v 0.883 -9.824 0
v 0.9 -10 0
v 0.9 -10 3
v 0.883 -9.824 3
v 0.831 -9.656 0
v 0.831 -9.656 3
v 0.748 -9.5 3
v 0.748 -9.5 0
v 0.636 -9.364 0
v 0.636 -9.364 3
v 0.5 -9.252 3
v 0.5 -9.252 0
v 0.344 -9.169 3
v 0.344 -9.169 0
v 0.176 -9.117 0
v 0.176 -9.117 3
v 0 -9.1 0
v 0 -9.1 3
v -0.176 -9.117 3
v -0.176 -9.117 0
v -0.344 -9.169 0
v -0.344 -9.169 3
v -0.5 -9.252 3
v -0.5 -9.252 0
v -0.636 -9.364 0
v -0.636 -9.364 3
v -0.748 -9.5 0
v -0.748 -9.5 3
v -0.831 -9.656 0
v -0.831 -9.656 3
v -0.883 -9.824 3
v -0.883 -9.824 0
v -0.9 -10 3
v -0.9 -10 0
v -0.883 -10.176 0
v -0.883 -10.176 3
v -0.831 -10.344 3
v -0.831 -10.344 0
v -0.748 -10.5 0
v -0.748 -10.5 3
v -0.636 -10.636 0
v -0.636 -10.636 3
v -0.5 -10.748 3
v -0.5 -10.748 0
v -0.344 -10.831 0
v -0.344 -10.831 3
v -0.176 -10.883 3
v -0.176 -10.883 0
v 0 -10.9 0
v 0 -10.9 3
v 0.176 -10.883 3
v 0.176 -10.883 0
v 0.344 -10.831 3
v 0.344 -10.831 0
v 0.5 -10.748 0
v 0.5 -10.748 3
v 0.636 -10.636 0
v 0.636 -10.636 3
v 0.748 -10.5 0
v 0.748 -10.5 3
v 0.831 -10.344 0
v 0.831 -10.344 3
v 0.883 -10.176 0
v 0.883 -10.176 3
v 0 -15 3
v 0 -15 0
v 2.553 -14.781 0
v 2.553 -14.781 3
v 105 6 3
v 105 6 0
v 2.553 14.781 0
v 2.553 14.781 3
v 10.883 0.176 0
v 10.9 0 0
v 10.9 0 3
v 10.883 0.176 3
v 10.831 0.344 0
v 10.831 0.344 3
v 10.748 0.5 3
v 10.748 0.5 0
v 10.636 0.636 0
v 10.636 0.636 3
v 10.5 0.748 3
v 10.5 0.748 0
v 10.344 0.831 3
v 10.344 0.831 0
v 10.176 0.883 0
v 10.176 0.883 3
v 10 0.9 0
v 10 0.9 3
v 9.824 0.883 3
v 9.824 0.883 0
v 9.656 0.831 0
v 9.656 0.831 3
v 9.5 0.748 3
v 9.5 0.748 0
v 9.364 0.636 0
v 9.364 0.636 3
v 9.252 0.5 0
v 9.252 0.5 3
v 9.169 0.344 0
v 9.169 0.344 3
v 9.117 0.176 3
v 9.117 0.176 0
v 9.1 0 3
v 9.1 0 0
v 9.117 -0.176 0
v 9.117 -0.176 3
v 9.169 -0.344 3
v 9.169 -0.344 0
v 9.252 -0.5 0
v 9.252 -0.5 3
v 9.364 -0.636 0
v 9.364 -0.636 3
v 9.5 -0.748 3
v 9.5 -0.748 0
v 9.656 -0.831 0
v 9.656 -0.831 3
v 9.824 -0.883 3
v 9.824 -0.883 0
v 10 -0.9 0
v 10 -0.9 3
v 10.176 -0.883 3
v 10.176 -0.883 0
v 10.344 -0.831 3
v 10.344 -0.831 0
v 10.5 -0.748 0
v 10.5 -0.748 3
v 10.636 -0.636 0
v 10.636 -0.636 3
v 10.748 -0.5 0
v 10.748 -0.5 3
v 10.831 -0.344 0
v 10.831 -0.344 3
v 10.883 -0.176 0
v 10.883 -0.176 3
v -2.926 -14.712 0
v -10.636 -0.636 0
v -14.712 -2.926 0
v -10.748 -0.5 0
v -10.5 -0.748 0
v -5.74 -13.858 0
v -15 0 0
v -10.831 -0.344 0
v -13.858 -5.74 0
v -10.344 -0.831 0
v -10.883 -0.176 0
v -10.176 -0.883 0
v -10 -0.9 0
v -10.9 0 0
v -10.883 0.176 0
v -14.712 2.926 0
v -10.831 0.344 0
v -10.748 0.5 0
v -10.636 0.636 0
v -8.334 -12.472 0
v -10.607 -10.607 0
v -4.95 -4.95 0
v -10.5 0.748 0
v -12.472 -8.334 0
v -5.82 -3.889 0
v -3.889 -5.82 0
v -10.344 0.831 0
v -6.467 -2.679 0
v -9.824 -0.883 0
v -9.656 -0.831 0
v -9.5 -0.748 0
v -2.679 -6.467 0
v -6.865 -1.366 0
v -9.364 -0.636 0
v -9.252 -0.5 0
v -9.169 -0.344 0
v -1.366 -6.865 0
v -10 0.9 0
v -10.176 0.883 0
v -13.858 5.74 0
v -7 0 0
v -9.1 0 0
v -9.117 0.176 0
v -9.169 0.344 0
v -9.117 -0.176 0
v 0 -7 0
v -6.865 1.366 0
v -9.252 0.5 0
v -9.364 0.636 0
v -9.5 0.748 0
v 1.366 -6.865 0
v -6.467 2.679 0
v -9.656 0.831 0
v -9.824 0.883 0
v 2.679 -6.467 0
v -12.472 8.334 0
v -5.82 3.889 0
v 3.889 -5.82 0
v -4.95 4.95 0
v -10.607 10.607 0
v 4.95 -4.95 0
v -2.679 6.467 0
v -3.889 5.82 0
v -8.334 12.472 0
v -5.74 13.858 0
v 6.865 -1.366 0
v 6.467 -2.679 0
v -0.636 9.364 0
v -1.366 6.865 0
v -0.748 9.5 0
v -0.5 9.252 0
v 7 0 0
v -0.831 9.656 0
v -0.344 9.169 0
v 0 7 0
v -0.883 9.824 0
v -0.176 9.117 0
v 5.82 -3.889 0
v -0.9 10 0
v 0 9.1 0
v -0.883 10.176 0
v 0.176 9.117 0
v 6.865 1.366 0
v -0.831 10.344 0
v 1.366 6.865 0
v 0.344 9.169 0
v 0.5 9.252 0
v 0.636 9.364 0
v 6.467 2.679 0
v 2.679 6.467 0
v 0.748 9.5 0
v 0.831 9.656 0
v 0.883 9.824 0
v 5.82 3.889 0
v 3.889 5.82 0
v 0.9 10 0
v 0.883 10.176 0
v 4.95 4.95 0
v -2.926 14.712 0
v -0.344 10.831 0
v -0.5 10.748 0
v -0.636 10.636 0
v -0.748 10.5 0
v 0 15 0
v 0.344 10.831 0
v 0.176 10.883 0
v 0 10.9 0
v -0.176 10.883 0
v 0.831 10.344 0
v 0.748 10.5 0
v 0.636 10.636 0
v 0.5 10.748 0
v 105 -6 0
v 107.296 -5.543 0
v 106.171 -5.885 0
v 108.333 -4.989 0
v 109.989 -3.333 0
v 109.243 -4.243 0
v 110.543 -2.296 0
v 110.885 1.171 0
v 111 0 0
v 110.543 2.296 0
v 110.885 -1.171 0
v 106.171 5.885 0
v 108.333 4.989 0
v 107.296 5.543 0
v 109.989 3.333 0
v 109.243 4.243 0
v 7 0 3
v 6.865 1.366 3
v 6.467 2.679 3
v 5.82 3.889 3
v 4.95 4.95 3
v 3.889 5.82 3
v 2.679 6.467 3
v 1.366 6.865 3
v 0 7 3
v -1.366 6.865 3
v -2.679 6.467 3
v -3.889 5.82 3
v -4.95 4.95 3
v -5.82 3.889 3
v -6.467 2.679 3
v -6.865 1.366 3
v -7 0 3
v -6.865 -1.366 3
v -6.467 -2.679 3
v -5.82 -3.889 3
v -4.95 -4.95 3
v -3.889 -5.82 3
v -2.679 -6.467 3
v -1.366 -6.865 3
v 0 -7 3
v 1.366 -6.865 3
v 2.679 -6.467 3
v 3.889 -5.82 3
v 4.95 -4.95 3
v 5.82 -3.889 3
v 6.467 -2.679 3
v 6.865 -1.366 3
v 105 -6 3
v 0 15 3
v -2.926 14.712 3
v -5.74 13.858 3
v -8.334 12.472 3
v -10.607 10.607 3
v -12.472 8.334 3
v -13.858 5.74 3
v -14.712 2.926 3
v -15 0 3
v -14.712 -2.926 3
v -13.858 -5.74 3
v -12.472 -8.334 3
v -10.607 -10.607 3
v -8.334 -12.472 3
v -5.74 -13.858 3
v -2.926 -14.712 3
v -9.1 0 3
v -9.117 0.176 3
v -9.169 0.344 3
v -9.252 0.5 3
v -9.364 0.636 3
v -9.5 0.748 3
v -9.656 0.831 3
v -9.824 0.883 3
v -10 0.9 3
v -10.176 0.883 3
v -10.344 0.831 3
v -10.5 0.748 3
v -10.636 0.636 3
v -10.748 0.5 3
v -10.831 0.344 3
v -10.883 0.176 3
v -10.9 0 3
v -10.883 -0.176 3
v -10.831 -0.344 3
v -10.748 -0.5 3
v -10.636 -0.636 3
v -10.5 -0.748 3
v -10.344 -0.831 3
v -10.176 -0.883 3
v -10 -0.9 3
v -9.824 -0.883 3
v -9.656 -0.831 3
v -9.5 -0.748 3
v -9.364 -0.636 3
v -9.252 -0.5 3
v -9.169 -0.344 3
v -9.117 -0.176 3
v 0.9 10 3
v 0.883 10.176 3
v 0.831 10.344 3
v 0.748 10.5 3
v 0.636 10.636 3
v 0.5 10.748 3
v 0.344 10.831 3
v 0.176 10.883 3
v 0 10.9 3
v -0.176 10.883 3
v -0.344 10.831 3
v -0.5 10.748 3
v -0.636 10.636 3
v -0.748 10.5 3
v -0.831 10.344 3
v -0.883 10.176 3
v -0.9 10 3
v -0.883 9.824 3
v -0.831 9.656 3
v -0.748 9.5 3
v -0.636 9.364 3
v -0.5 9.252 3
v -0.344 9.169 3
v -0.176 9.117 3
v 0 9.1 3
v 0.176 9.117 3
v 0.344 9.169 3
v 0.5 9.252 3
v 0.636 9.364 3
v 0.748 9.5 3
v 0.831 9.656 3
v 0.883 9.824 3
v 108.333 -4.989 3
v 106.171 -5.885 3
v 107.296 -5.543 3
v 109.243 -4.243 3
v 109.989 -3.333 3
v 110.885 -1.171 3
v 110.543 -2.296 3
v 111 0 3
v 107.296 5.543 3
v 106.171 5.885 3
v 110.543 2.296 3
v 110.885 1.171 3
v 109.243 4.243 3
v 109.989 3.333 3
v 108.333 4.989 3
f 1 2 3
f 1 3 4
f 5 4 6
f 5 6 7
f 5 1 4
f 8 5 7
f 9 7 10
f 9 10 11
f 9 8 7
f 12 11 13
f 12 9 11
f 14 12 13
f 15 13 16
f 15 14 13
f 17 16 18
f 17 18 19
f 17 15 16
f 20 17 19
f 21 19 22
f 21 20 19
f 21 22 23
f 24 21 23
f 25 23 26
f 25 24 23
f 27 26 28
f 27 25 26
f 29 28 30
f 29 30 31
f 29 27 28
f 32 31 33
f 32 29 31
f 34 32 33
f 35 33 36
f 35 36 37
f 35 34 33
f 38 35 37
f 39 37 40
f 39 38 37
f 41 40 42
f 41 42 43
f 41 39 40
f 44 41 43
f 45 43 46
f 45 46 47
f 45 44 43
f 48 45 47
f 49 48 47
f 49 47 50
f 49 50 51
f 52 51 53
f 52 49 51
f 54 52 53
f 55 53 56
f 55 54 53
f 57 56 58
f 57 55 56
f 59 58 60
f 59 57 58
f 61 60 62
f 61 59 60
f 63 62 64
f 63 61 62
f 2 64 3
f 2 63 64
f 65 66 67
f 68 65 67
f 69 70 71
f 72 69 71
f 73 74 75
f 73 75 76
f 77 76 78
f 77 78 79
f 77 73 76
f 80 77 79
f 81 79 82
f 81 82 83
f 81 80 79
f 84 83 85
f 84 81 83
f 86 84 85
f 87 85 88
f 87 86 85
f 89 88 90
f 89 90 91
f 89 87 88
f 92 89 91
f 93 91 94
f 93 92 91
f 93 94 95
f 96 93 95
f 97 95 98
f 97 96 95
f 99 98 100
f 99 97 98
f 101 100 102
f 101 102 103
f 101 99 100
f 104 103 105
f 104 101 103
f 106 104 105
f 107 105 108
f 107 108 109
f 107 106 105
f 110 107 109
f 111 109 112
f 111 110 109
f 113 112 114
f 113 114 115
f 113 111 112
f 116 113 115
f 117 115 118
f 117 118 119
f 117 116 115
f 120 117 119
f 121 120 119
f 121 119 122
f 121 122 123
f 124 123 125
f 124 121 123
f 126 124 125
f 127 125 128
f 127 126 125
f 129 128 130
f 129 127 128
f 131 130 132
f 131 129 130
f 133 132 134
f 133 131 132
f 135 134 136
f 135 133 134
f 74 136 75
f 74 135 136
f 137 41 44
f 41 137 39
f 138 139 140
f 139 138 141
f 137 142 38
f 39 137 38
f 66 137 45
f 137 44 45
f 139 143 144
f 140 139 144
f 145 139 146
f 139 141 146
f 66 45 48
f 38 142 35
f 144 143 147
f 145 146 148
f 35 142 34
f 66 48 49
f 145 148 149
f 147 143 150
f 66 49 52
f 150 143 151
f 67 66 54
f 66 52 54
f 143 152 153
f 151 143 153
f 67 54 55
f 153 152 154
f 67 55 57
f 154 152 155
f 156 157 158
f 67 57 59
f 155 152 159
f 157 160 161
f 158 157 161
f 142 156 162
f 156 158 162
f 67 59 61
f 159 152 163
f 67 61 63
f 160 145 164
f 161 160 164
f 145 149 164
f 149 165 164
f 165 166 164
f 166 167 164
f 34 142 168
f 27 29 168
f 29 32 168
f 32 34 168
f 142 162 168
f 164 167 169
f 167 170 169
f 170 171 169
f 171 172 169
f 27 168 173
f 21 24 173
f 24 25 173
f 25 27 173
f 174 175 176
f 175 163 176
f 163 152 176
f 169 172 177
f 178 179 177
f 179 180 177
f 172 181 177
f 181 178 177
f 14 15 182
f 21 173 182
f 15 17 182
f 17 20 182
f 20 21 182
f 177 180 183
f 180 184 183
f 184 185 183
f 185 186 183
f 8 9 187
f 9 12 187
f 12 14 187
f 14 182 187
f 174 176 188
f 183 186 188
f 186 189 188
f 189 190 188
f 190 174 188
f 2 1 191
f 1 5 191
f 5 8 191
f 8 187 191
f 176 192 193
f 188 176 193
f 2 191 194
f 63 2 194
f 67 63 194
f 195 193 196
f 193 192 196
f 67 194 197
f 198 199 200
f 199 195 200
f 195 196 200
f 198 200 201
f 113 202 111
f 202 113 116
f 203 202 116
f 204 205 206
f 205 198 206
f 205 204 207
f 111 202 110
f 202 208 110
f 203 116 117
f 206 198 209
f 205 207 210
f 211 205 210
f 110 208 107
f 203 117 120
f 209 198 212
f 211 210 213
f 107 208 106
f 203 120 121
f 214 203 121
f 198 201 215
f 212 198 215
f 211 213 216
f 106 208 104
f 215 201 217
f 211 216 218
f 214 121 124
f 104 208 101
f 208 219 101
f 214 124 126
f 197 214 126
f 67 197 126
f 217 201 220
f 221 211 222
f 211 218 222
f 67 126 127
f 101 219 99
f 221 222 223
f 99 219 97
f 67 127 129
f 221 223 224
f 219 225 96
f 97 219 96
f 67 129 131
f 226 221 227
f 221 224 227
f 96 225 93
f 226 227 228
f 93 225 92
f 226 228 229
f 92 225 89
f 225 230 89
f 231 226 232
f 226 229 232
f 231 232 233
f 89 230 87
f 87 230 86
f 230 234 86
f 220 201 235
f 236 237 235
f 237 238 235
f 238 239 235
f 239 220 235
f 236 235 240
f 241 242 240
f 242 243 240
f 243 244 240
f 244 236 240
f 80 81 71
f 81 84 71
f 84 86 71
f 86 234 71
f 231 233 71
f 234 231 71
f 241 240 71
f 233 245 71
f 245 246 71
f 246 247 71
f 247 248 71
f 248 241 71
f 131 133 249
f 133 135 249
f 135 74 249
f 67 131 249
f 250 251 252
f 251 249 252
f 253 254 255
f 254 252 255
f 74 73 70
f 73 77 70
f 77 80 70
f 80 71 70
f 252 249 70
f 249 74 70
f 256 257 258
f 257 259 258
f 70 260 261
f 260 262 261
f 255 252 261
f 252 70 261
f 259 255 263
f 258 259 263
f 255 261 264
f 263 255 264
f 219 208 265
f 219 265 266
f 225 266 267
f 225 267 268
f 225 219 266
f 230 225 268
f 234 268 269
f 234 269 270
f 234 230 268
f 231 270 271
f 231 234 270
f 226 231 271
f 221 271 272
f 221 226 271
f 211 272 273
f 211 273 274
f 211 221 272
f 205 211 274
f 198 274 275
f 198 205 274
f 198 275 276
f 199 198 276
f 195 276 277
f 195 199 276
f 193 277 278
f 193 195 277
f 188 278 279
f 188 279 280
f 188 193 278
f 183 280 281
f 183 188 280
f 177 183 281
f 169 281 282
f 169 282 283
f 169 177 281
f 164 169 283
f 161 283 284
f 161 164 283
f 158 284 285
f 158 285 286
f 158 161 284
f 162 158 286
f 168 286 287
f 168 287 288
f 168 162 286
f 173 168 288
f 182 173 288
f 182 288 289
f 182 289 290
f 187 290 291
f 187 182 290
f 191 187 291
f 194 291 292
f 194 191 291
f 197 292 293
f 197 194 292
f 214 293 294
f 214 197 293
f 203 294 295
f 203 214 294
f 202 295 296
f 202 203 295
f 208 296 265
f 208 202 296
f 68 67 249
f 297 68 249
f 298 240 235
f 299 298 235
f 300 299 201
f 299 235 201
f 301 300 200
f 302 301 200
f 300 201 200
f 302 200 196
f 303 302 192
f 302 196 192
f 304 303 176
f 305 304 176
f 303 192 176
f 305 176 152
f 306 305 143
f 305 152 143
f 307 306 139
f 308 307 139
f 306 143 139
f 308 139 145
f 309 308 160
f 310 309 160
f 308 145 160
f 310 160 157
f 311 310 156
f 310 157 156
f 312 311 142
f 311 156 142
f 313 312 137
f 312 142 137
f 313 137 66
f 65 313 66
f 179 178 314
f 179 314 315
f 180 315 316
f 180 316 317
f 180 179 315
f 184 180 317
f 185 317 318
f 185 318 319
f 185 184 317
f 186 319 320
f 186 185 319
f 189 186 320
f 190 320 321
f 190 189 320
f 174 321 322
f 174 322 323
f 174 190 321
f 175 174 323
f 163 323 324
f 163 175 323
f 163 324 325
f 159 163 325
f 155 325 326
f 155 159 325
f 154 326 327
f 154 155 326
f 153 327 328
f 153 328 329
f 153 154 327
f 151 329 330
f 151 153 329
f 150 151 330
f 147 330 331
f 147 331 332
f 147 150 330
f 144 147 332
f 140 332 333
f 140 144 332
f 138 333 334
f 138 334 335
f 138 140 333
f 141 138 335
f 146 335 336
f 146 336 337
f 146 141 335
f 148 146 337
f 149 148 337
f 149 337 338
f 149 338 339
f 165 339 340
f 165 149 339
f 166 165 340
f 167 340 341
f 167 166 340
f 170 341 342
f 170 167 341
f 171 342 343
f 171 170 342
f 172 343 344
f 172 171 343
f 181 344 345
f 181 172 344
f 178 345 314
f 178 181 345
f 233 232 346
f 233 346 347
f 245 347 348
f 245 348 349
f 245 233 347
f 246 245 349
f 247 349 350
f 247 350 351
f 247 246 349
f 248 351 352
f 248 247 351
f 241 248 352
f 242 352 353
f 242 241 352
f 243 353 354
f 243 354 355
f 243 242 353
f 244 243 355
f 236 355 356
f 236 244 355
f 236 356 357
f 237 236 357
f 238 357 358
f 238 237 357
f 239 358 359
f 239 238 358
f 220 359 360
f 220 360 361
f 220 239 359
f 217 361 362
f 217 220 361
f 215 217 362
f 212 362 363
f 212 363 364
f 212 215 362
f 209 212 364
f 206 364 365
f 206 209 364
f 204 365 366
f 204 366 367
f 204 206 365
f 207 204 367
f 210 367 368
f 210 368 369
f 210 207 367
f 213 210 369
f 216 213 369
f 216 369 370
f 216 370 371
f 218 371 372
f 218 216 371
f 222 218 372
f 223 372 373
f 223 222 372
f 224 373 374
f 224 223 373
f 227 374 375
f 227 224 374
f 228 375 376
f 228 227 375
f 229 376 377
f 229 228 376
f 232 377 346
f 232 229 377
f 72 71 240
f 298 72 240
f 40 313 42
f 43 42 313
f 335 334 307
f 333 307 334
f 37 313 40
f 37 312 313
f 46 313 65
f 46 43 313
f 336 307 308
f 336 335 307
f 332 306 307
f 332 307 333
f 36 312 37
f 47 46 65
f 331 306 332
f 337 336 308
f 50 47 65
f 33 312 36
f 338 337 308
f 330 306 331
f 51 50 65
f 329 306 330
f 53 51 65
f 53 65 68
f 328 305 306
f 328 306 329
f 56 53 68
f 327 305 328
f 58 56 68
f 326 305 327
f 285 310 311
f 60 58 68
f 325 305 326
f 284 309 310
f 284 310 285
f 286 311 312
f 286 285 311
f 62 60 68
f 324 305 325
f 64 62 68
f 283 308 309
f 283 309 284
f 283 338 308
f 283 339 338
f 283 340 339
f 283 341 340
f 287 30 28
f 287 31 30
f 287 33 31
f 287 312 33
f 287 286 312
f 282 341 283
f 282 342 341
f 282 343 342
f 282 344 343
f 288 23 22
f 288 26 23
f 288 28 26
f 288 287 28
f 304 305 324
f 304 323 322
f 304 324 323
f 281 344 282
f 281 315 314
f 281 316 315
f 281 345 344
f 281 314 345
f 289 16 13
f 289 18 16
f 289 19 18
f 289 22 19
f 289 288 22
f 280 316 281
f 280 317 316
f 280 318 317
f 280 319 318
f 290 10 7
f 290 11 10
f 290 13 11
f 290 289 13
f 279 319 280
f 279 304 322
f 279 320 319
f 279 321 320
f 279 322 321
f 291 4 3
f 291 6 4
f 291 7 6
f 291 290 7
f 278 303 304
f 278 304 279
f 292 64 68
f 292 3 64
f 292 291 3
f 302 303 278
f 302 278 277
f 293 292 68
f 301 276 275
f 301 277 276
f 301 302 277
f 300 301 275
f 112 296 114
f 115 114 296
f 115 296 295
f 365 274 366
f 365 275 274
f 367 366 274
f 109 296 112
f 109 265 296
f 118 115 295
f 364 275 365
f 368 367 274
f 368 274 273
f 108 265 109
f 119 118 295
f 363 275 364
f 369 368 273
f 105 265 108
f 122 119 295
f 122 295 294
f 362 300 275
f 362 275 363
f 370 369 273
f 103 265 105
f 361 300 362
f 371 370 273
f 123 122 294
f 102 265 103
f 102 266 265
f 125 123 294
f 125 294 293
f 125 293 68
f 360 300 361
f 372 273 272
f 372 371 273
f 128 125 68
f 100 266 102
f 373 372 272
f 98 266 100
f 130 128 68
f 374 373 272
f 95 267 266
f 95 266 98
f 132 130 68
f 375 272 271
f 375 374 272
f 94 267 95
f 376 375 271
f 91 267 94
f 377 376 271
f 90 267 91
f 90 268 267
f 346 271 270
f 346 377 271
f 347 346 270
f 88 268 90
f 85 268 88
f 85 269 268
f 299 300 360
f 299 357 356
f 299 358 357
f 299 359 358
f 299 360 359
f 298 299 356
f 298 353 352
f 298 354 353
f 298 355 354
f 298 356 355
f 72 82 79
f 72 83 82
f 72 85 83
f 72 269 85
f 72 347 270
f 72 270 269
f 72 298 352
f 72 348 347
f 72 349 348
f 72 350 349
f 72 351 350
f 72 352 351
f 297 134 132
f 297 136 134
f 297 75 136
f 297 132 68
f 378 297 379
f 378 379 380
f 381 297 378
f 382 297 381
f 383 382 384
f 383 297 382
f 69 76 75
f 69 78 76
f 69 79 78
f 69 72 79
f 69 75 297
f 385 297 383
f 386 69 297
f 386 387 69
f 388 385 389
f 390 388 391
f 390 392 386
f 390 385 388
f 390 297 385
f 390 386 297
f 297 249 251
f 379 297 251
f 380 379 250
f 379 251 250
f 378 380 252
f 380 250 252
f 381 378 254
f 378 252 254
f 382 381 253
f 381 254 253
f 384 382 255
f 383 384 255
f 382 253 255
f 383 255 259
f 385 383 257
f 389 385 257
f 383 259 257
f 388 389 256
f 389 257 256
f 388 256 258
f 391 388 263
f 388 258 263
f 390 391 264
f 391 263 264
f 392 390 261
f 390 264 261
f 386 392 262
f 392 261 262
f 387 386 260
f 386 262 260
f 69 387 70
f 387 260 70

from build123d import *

# Parameters (mm, degrees)
SKETCH1_R           = 6
SKETCH1_R_2         = 0.9
SKETCH1_R_3         = 7
BOSS_EXTRUDE1_DEPTH = 3


with BuildPart() as part:
    # Sketch1 → Boss-Extrude1 (new body)
    # profile 1 of 3: a face of its own
    with BuildSketch(Plane.XY):
        with BuildLine():
            Line((105, 6), (2.55267423, 14.781199352))
            ThreePointArc((2.55267423, 14.781199352), (11.473667972, 9.662036187), (15, 0))
            ThreePointArc((15, 0), (11.473667972, -9.662036187), (2.55267423, -14.781199352))
            Line((2.55267423, -14.781199352), (105, -6))
            ThreePointArc((105, -6), (99, 0), (105, 6))
        make_face()
    # profile 2 of 3: a face of its own
    with BuildSketch(Plane.XY):
        with Locations((105, 0)):
            Circle(SKETCH1_R)
    # profile 3 of 3: a face of its own
    with BuildSketch(Plane.XY):
        with BuildLine():
            Line((2.55267423, 14.781199352), (0, 15))
            ThreePointArc((0, 15), (-15, 0), (0, -15))
            Line((0, -15), (2.55267423, -14.781199352))
            ThreePointArc((2.55267423, -14.781199352), (11.473667972, -9.662036187), (15, 0))
            ThreePointArc((15, 0), (11.473667972, 9.662036187), (2.55267423, 14.781199352))
        make_face()
        with Locations((0, -10)):
            Circle(SKETCH1_R_2, mode=Mode.SUBTRACT)
        with Locations((10, 0)):
            Circle(SKETCH1_R_2, mode=Mode.SUBTRACT)
        with Locations((-10, 0)):
            Circle(SKETCH1_R_2, mode=Mode.SUBTRACT)
        Circle(SKETCH1_R_3, mode=Mode.SUBTRACT)
        with Locations((0, 10)):
            Circle(SKETCH1_R_2, mode=Mode.SUBTRACT)
    extrude(amount=BOSS_EXTRUDE1_DEPTH)


solid = part.part
